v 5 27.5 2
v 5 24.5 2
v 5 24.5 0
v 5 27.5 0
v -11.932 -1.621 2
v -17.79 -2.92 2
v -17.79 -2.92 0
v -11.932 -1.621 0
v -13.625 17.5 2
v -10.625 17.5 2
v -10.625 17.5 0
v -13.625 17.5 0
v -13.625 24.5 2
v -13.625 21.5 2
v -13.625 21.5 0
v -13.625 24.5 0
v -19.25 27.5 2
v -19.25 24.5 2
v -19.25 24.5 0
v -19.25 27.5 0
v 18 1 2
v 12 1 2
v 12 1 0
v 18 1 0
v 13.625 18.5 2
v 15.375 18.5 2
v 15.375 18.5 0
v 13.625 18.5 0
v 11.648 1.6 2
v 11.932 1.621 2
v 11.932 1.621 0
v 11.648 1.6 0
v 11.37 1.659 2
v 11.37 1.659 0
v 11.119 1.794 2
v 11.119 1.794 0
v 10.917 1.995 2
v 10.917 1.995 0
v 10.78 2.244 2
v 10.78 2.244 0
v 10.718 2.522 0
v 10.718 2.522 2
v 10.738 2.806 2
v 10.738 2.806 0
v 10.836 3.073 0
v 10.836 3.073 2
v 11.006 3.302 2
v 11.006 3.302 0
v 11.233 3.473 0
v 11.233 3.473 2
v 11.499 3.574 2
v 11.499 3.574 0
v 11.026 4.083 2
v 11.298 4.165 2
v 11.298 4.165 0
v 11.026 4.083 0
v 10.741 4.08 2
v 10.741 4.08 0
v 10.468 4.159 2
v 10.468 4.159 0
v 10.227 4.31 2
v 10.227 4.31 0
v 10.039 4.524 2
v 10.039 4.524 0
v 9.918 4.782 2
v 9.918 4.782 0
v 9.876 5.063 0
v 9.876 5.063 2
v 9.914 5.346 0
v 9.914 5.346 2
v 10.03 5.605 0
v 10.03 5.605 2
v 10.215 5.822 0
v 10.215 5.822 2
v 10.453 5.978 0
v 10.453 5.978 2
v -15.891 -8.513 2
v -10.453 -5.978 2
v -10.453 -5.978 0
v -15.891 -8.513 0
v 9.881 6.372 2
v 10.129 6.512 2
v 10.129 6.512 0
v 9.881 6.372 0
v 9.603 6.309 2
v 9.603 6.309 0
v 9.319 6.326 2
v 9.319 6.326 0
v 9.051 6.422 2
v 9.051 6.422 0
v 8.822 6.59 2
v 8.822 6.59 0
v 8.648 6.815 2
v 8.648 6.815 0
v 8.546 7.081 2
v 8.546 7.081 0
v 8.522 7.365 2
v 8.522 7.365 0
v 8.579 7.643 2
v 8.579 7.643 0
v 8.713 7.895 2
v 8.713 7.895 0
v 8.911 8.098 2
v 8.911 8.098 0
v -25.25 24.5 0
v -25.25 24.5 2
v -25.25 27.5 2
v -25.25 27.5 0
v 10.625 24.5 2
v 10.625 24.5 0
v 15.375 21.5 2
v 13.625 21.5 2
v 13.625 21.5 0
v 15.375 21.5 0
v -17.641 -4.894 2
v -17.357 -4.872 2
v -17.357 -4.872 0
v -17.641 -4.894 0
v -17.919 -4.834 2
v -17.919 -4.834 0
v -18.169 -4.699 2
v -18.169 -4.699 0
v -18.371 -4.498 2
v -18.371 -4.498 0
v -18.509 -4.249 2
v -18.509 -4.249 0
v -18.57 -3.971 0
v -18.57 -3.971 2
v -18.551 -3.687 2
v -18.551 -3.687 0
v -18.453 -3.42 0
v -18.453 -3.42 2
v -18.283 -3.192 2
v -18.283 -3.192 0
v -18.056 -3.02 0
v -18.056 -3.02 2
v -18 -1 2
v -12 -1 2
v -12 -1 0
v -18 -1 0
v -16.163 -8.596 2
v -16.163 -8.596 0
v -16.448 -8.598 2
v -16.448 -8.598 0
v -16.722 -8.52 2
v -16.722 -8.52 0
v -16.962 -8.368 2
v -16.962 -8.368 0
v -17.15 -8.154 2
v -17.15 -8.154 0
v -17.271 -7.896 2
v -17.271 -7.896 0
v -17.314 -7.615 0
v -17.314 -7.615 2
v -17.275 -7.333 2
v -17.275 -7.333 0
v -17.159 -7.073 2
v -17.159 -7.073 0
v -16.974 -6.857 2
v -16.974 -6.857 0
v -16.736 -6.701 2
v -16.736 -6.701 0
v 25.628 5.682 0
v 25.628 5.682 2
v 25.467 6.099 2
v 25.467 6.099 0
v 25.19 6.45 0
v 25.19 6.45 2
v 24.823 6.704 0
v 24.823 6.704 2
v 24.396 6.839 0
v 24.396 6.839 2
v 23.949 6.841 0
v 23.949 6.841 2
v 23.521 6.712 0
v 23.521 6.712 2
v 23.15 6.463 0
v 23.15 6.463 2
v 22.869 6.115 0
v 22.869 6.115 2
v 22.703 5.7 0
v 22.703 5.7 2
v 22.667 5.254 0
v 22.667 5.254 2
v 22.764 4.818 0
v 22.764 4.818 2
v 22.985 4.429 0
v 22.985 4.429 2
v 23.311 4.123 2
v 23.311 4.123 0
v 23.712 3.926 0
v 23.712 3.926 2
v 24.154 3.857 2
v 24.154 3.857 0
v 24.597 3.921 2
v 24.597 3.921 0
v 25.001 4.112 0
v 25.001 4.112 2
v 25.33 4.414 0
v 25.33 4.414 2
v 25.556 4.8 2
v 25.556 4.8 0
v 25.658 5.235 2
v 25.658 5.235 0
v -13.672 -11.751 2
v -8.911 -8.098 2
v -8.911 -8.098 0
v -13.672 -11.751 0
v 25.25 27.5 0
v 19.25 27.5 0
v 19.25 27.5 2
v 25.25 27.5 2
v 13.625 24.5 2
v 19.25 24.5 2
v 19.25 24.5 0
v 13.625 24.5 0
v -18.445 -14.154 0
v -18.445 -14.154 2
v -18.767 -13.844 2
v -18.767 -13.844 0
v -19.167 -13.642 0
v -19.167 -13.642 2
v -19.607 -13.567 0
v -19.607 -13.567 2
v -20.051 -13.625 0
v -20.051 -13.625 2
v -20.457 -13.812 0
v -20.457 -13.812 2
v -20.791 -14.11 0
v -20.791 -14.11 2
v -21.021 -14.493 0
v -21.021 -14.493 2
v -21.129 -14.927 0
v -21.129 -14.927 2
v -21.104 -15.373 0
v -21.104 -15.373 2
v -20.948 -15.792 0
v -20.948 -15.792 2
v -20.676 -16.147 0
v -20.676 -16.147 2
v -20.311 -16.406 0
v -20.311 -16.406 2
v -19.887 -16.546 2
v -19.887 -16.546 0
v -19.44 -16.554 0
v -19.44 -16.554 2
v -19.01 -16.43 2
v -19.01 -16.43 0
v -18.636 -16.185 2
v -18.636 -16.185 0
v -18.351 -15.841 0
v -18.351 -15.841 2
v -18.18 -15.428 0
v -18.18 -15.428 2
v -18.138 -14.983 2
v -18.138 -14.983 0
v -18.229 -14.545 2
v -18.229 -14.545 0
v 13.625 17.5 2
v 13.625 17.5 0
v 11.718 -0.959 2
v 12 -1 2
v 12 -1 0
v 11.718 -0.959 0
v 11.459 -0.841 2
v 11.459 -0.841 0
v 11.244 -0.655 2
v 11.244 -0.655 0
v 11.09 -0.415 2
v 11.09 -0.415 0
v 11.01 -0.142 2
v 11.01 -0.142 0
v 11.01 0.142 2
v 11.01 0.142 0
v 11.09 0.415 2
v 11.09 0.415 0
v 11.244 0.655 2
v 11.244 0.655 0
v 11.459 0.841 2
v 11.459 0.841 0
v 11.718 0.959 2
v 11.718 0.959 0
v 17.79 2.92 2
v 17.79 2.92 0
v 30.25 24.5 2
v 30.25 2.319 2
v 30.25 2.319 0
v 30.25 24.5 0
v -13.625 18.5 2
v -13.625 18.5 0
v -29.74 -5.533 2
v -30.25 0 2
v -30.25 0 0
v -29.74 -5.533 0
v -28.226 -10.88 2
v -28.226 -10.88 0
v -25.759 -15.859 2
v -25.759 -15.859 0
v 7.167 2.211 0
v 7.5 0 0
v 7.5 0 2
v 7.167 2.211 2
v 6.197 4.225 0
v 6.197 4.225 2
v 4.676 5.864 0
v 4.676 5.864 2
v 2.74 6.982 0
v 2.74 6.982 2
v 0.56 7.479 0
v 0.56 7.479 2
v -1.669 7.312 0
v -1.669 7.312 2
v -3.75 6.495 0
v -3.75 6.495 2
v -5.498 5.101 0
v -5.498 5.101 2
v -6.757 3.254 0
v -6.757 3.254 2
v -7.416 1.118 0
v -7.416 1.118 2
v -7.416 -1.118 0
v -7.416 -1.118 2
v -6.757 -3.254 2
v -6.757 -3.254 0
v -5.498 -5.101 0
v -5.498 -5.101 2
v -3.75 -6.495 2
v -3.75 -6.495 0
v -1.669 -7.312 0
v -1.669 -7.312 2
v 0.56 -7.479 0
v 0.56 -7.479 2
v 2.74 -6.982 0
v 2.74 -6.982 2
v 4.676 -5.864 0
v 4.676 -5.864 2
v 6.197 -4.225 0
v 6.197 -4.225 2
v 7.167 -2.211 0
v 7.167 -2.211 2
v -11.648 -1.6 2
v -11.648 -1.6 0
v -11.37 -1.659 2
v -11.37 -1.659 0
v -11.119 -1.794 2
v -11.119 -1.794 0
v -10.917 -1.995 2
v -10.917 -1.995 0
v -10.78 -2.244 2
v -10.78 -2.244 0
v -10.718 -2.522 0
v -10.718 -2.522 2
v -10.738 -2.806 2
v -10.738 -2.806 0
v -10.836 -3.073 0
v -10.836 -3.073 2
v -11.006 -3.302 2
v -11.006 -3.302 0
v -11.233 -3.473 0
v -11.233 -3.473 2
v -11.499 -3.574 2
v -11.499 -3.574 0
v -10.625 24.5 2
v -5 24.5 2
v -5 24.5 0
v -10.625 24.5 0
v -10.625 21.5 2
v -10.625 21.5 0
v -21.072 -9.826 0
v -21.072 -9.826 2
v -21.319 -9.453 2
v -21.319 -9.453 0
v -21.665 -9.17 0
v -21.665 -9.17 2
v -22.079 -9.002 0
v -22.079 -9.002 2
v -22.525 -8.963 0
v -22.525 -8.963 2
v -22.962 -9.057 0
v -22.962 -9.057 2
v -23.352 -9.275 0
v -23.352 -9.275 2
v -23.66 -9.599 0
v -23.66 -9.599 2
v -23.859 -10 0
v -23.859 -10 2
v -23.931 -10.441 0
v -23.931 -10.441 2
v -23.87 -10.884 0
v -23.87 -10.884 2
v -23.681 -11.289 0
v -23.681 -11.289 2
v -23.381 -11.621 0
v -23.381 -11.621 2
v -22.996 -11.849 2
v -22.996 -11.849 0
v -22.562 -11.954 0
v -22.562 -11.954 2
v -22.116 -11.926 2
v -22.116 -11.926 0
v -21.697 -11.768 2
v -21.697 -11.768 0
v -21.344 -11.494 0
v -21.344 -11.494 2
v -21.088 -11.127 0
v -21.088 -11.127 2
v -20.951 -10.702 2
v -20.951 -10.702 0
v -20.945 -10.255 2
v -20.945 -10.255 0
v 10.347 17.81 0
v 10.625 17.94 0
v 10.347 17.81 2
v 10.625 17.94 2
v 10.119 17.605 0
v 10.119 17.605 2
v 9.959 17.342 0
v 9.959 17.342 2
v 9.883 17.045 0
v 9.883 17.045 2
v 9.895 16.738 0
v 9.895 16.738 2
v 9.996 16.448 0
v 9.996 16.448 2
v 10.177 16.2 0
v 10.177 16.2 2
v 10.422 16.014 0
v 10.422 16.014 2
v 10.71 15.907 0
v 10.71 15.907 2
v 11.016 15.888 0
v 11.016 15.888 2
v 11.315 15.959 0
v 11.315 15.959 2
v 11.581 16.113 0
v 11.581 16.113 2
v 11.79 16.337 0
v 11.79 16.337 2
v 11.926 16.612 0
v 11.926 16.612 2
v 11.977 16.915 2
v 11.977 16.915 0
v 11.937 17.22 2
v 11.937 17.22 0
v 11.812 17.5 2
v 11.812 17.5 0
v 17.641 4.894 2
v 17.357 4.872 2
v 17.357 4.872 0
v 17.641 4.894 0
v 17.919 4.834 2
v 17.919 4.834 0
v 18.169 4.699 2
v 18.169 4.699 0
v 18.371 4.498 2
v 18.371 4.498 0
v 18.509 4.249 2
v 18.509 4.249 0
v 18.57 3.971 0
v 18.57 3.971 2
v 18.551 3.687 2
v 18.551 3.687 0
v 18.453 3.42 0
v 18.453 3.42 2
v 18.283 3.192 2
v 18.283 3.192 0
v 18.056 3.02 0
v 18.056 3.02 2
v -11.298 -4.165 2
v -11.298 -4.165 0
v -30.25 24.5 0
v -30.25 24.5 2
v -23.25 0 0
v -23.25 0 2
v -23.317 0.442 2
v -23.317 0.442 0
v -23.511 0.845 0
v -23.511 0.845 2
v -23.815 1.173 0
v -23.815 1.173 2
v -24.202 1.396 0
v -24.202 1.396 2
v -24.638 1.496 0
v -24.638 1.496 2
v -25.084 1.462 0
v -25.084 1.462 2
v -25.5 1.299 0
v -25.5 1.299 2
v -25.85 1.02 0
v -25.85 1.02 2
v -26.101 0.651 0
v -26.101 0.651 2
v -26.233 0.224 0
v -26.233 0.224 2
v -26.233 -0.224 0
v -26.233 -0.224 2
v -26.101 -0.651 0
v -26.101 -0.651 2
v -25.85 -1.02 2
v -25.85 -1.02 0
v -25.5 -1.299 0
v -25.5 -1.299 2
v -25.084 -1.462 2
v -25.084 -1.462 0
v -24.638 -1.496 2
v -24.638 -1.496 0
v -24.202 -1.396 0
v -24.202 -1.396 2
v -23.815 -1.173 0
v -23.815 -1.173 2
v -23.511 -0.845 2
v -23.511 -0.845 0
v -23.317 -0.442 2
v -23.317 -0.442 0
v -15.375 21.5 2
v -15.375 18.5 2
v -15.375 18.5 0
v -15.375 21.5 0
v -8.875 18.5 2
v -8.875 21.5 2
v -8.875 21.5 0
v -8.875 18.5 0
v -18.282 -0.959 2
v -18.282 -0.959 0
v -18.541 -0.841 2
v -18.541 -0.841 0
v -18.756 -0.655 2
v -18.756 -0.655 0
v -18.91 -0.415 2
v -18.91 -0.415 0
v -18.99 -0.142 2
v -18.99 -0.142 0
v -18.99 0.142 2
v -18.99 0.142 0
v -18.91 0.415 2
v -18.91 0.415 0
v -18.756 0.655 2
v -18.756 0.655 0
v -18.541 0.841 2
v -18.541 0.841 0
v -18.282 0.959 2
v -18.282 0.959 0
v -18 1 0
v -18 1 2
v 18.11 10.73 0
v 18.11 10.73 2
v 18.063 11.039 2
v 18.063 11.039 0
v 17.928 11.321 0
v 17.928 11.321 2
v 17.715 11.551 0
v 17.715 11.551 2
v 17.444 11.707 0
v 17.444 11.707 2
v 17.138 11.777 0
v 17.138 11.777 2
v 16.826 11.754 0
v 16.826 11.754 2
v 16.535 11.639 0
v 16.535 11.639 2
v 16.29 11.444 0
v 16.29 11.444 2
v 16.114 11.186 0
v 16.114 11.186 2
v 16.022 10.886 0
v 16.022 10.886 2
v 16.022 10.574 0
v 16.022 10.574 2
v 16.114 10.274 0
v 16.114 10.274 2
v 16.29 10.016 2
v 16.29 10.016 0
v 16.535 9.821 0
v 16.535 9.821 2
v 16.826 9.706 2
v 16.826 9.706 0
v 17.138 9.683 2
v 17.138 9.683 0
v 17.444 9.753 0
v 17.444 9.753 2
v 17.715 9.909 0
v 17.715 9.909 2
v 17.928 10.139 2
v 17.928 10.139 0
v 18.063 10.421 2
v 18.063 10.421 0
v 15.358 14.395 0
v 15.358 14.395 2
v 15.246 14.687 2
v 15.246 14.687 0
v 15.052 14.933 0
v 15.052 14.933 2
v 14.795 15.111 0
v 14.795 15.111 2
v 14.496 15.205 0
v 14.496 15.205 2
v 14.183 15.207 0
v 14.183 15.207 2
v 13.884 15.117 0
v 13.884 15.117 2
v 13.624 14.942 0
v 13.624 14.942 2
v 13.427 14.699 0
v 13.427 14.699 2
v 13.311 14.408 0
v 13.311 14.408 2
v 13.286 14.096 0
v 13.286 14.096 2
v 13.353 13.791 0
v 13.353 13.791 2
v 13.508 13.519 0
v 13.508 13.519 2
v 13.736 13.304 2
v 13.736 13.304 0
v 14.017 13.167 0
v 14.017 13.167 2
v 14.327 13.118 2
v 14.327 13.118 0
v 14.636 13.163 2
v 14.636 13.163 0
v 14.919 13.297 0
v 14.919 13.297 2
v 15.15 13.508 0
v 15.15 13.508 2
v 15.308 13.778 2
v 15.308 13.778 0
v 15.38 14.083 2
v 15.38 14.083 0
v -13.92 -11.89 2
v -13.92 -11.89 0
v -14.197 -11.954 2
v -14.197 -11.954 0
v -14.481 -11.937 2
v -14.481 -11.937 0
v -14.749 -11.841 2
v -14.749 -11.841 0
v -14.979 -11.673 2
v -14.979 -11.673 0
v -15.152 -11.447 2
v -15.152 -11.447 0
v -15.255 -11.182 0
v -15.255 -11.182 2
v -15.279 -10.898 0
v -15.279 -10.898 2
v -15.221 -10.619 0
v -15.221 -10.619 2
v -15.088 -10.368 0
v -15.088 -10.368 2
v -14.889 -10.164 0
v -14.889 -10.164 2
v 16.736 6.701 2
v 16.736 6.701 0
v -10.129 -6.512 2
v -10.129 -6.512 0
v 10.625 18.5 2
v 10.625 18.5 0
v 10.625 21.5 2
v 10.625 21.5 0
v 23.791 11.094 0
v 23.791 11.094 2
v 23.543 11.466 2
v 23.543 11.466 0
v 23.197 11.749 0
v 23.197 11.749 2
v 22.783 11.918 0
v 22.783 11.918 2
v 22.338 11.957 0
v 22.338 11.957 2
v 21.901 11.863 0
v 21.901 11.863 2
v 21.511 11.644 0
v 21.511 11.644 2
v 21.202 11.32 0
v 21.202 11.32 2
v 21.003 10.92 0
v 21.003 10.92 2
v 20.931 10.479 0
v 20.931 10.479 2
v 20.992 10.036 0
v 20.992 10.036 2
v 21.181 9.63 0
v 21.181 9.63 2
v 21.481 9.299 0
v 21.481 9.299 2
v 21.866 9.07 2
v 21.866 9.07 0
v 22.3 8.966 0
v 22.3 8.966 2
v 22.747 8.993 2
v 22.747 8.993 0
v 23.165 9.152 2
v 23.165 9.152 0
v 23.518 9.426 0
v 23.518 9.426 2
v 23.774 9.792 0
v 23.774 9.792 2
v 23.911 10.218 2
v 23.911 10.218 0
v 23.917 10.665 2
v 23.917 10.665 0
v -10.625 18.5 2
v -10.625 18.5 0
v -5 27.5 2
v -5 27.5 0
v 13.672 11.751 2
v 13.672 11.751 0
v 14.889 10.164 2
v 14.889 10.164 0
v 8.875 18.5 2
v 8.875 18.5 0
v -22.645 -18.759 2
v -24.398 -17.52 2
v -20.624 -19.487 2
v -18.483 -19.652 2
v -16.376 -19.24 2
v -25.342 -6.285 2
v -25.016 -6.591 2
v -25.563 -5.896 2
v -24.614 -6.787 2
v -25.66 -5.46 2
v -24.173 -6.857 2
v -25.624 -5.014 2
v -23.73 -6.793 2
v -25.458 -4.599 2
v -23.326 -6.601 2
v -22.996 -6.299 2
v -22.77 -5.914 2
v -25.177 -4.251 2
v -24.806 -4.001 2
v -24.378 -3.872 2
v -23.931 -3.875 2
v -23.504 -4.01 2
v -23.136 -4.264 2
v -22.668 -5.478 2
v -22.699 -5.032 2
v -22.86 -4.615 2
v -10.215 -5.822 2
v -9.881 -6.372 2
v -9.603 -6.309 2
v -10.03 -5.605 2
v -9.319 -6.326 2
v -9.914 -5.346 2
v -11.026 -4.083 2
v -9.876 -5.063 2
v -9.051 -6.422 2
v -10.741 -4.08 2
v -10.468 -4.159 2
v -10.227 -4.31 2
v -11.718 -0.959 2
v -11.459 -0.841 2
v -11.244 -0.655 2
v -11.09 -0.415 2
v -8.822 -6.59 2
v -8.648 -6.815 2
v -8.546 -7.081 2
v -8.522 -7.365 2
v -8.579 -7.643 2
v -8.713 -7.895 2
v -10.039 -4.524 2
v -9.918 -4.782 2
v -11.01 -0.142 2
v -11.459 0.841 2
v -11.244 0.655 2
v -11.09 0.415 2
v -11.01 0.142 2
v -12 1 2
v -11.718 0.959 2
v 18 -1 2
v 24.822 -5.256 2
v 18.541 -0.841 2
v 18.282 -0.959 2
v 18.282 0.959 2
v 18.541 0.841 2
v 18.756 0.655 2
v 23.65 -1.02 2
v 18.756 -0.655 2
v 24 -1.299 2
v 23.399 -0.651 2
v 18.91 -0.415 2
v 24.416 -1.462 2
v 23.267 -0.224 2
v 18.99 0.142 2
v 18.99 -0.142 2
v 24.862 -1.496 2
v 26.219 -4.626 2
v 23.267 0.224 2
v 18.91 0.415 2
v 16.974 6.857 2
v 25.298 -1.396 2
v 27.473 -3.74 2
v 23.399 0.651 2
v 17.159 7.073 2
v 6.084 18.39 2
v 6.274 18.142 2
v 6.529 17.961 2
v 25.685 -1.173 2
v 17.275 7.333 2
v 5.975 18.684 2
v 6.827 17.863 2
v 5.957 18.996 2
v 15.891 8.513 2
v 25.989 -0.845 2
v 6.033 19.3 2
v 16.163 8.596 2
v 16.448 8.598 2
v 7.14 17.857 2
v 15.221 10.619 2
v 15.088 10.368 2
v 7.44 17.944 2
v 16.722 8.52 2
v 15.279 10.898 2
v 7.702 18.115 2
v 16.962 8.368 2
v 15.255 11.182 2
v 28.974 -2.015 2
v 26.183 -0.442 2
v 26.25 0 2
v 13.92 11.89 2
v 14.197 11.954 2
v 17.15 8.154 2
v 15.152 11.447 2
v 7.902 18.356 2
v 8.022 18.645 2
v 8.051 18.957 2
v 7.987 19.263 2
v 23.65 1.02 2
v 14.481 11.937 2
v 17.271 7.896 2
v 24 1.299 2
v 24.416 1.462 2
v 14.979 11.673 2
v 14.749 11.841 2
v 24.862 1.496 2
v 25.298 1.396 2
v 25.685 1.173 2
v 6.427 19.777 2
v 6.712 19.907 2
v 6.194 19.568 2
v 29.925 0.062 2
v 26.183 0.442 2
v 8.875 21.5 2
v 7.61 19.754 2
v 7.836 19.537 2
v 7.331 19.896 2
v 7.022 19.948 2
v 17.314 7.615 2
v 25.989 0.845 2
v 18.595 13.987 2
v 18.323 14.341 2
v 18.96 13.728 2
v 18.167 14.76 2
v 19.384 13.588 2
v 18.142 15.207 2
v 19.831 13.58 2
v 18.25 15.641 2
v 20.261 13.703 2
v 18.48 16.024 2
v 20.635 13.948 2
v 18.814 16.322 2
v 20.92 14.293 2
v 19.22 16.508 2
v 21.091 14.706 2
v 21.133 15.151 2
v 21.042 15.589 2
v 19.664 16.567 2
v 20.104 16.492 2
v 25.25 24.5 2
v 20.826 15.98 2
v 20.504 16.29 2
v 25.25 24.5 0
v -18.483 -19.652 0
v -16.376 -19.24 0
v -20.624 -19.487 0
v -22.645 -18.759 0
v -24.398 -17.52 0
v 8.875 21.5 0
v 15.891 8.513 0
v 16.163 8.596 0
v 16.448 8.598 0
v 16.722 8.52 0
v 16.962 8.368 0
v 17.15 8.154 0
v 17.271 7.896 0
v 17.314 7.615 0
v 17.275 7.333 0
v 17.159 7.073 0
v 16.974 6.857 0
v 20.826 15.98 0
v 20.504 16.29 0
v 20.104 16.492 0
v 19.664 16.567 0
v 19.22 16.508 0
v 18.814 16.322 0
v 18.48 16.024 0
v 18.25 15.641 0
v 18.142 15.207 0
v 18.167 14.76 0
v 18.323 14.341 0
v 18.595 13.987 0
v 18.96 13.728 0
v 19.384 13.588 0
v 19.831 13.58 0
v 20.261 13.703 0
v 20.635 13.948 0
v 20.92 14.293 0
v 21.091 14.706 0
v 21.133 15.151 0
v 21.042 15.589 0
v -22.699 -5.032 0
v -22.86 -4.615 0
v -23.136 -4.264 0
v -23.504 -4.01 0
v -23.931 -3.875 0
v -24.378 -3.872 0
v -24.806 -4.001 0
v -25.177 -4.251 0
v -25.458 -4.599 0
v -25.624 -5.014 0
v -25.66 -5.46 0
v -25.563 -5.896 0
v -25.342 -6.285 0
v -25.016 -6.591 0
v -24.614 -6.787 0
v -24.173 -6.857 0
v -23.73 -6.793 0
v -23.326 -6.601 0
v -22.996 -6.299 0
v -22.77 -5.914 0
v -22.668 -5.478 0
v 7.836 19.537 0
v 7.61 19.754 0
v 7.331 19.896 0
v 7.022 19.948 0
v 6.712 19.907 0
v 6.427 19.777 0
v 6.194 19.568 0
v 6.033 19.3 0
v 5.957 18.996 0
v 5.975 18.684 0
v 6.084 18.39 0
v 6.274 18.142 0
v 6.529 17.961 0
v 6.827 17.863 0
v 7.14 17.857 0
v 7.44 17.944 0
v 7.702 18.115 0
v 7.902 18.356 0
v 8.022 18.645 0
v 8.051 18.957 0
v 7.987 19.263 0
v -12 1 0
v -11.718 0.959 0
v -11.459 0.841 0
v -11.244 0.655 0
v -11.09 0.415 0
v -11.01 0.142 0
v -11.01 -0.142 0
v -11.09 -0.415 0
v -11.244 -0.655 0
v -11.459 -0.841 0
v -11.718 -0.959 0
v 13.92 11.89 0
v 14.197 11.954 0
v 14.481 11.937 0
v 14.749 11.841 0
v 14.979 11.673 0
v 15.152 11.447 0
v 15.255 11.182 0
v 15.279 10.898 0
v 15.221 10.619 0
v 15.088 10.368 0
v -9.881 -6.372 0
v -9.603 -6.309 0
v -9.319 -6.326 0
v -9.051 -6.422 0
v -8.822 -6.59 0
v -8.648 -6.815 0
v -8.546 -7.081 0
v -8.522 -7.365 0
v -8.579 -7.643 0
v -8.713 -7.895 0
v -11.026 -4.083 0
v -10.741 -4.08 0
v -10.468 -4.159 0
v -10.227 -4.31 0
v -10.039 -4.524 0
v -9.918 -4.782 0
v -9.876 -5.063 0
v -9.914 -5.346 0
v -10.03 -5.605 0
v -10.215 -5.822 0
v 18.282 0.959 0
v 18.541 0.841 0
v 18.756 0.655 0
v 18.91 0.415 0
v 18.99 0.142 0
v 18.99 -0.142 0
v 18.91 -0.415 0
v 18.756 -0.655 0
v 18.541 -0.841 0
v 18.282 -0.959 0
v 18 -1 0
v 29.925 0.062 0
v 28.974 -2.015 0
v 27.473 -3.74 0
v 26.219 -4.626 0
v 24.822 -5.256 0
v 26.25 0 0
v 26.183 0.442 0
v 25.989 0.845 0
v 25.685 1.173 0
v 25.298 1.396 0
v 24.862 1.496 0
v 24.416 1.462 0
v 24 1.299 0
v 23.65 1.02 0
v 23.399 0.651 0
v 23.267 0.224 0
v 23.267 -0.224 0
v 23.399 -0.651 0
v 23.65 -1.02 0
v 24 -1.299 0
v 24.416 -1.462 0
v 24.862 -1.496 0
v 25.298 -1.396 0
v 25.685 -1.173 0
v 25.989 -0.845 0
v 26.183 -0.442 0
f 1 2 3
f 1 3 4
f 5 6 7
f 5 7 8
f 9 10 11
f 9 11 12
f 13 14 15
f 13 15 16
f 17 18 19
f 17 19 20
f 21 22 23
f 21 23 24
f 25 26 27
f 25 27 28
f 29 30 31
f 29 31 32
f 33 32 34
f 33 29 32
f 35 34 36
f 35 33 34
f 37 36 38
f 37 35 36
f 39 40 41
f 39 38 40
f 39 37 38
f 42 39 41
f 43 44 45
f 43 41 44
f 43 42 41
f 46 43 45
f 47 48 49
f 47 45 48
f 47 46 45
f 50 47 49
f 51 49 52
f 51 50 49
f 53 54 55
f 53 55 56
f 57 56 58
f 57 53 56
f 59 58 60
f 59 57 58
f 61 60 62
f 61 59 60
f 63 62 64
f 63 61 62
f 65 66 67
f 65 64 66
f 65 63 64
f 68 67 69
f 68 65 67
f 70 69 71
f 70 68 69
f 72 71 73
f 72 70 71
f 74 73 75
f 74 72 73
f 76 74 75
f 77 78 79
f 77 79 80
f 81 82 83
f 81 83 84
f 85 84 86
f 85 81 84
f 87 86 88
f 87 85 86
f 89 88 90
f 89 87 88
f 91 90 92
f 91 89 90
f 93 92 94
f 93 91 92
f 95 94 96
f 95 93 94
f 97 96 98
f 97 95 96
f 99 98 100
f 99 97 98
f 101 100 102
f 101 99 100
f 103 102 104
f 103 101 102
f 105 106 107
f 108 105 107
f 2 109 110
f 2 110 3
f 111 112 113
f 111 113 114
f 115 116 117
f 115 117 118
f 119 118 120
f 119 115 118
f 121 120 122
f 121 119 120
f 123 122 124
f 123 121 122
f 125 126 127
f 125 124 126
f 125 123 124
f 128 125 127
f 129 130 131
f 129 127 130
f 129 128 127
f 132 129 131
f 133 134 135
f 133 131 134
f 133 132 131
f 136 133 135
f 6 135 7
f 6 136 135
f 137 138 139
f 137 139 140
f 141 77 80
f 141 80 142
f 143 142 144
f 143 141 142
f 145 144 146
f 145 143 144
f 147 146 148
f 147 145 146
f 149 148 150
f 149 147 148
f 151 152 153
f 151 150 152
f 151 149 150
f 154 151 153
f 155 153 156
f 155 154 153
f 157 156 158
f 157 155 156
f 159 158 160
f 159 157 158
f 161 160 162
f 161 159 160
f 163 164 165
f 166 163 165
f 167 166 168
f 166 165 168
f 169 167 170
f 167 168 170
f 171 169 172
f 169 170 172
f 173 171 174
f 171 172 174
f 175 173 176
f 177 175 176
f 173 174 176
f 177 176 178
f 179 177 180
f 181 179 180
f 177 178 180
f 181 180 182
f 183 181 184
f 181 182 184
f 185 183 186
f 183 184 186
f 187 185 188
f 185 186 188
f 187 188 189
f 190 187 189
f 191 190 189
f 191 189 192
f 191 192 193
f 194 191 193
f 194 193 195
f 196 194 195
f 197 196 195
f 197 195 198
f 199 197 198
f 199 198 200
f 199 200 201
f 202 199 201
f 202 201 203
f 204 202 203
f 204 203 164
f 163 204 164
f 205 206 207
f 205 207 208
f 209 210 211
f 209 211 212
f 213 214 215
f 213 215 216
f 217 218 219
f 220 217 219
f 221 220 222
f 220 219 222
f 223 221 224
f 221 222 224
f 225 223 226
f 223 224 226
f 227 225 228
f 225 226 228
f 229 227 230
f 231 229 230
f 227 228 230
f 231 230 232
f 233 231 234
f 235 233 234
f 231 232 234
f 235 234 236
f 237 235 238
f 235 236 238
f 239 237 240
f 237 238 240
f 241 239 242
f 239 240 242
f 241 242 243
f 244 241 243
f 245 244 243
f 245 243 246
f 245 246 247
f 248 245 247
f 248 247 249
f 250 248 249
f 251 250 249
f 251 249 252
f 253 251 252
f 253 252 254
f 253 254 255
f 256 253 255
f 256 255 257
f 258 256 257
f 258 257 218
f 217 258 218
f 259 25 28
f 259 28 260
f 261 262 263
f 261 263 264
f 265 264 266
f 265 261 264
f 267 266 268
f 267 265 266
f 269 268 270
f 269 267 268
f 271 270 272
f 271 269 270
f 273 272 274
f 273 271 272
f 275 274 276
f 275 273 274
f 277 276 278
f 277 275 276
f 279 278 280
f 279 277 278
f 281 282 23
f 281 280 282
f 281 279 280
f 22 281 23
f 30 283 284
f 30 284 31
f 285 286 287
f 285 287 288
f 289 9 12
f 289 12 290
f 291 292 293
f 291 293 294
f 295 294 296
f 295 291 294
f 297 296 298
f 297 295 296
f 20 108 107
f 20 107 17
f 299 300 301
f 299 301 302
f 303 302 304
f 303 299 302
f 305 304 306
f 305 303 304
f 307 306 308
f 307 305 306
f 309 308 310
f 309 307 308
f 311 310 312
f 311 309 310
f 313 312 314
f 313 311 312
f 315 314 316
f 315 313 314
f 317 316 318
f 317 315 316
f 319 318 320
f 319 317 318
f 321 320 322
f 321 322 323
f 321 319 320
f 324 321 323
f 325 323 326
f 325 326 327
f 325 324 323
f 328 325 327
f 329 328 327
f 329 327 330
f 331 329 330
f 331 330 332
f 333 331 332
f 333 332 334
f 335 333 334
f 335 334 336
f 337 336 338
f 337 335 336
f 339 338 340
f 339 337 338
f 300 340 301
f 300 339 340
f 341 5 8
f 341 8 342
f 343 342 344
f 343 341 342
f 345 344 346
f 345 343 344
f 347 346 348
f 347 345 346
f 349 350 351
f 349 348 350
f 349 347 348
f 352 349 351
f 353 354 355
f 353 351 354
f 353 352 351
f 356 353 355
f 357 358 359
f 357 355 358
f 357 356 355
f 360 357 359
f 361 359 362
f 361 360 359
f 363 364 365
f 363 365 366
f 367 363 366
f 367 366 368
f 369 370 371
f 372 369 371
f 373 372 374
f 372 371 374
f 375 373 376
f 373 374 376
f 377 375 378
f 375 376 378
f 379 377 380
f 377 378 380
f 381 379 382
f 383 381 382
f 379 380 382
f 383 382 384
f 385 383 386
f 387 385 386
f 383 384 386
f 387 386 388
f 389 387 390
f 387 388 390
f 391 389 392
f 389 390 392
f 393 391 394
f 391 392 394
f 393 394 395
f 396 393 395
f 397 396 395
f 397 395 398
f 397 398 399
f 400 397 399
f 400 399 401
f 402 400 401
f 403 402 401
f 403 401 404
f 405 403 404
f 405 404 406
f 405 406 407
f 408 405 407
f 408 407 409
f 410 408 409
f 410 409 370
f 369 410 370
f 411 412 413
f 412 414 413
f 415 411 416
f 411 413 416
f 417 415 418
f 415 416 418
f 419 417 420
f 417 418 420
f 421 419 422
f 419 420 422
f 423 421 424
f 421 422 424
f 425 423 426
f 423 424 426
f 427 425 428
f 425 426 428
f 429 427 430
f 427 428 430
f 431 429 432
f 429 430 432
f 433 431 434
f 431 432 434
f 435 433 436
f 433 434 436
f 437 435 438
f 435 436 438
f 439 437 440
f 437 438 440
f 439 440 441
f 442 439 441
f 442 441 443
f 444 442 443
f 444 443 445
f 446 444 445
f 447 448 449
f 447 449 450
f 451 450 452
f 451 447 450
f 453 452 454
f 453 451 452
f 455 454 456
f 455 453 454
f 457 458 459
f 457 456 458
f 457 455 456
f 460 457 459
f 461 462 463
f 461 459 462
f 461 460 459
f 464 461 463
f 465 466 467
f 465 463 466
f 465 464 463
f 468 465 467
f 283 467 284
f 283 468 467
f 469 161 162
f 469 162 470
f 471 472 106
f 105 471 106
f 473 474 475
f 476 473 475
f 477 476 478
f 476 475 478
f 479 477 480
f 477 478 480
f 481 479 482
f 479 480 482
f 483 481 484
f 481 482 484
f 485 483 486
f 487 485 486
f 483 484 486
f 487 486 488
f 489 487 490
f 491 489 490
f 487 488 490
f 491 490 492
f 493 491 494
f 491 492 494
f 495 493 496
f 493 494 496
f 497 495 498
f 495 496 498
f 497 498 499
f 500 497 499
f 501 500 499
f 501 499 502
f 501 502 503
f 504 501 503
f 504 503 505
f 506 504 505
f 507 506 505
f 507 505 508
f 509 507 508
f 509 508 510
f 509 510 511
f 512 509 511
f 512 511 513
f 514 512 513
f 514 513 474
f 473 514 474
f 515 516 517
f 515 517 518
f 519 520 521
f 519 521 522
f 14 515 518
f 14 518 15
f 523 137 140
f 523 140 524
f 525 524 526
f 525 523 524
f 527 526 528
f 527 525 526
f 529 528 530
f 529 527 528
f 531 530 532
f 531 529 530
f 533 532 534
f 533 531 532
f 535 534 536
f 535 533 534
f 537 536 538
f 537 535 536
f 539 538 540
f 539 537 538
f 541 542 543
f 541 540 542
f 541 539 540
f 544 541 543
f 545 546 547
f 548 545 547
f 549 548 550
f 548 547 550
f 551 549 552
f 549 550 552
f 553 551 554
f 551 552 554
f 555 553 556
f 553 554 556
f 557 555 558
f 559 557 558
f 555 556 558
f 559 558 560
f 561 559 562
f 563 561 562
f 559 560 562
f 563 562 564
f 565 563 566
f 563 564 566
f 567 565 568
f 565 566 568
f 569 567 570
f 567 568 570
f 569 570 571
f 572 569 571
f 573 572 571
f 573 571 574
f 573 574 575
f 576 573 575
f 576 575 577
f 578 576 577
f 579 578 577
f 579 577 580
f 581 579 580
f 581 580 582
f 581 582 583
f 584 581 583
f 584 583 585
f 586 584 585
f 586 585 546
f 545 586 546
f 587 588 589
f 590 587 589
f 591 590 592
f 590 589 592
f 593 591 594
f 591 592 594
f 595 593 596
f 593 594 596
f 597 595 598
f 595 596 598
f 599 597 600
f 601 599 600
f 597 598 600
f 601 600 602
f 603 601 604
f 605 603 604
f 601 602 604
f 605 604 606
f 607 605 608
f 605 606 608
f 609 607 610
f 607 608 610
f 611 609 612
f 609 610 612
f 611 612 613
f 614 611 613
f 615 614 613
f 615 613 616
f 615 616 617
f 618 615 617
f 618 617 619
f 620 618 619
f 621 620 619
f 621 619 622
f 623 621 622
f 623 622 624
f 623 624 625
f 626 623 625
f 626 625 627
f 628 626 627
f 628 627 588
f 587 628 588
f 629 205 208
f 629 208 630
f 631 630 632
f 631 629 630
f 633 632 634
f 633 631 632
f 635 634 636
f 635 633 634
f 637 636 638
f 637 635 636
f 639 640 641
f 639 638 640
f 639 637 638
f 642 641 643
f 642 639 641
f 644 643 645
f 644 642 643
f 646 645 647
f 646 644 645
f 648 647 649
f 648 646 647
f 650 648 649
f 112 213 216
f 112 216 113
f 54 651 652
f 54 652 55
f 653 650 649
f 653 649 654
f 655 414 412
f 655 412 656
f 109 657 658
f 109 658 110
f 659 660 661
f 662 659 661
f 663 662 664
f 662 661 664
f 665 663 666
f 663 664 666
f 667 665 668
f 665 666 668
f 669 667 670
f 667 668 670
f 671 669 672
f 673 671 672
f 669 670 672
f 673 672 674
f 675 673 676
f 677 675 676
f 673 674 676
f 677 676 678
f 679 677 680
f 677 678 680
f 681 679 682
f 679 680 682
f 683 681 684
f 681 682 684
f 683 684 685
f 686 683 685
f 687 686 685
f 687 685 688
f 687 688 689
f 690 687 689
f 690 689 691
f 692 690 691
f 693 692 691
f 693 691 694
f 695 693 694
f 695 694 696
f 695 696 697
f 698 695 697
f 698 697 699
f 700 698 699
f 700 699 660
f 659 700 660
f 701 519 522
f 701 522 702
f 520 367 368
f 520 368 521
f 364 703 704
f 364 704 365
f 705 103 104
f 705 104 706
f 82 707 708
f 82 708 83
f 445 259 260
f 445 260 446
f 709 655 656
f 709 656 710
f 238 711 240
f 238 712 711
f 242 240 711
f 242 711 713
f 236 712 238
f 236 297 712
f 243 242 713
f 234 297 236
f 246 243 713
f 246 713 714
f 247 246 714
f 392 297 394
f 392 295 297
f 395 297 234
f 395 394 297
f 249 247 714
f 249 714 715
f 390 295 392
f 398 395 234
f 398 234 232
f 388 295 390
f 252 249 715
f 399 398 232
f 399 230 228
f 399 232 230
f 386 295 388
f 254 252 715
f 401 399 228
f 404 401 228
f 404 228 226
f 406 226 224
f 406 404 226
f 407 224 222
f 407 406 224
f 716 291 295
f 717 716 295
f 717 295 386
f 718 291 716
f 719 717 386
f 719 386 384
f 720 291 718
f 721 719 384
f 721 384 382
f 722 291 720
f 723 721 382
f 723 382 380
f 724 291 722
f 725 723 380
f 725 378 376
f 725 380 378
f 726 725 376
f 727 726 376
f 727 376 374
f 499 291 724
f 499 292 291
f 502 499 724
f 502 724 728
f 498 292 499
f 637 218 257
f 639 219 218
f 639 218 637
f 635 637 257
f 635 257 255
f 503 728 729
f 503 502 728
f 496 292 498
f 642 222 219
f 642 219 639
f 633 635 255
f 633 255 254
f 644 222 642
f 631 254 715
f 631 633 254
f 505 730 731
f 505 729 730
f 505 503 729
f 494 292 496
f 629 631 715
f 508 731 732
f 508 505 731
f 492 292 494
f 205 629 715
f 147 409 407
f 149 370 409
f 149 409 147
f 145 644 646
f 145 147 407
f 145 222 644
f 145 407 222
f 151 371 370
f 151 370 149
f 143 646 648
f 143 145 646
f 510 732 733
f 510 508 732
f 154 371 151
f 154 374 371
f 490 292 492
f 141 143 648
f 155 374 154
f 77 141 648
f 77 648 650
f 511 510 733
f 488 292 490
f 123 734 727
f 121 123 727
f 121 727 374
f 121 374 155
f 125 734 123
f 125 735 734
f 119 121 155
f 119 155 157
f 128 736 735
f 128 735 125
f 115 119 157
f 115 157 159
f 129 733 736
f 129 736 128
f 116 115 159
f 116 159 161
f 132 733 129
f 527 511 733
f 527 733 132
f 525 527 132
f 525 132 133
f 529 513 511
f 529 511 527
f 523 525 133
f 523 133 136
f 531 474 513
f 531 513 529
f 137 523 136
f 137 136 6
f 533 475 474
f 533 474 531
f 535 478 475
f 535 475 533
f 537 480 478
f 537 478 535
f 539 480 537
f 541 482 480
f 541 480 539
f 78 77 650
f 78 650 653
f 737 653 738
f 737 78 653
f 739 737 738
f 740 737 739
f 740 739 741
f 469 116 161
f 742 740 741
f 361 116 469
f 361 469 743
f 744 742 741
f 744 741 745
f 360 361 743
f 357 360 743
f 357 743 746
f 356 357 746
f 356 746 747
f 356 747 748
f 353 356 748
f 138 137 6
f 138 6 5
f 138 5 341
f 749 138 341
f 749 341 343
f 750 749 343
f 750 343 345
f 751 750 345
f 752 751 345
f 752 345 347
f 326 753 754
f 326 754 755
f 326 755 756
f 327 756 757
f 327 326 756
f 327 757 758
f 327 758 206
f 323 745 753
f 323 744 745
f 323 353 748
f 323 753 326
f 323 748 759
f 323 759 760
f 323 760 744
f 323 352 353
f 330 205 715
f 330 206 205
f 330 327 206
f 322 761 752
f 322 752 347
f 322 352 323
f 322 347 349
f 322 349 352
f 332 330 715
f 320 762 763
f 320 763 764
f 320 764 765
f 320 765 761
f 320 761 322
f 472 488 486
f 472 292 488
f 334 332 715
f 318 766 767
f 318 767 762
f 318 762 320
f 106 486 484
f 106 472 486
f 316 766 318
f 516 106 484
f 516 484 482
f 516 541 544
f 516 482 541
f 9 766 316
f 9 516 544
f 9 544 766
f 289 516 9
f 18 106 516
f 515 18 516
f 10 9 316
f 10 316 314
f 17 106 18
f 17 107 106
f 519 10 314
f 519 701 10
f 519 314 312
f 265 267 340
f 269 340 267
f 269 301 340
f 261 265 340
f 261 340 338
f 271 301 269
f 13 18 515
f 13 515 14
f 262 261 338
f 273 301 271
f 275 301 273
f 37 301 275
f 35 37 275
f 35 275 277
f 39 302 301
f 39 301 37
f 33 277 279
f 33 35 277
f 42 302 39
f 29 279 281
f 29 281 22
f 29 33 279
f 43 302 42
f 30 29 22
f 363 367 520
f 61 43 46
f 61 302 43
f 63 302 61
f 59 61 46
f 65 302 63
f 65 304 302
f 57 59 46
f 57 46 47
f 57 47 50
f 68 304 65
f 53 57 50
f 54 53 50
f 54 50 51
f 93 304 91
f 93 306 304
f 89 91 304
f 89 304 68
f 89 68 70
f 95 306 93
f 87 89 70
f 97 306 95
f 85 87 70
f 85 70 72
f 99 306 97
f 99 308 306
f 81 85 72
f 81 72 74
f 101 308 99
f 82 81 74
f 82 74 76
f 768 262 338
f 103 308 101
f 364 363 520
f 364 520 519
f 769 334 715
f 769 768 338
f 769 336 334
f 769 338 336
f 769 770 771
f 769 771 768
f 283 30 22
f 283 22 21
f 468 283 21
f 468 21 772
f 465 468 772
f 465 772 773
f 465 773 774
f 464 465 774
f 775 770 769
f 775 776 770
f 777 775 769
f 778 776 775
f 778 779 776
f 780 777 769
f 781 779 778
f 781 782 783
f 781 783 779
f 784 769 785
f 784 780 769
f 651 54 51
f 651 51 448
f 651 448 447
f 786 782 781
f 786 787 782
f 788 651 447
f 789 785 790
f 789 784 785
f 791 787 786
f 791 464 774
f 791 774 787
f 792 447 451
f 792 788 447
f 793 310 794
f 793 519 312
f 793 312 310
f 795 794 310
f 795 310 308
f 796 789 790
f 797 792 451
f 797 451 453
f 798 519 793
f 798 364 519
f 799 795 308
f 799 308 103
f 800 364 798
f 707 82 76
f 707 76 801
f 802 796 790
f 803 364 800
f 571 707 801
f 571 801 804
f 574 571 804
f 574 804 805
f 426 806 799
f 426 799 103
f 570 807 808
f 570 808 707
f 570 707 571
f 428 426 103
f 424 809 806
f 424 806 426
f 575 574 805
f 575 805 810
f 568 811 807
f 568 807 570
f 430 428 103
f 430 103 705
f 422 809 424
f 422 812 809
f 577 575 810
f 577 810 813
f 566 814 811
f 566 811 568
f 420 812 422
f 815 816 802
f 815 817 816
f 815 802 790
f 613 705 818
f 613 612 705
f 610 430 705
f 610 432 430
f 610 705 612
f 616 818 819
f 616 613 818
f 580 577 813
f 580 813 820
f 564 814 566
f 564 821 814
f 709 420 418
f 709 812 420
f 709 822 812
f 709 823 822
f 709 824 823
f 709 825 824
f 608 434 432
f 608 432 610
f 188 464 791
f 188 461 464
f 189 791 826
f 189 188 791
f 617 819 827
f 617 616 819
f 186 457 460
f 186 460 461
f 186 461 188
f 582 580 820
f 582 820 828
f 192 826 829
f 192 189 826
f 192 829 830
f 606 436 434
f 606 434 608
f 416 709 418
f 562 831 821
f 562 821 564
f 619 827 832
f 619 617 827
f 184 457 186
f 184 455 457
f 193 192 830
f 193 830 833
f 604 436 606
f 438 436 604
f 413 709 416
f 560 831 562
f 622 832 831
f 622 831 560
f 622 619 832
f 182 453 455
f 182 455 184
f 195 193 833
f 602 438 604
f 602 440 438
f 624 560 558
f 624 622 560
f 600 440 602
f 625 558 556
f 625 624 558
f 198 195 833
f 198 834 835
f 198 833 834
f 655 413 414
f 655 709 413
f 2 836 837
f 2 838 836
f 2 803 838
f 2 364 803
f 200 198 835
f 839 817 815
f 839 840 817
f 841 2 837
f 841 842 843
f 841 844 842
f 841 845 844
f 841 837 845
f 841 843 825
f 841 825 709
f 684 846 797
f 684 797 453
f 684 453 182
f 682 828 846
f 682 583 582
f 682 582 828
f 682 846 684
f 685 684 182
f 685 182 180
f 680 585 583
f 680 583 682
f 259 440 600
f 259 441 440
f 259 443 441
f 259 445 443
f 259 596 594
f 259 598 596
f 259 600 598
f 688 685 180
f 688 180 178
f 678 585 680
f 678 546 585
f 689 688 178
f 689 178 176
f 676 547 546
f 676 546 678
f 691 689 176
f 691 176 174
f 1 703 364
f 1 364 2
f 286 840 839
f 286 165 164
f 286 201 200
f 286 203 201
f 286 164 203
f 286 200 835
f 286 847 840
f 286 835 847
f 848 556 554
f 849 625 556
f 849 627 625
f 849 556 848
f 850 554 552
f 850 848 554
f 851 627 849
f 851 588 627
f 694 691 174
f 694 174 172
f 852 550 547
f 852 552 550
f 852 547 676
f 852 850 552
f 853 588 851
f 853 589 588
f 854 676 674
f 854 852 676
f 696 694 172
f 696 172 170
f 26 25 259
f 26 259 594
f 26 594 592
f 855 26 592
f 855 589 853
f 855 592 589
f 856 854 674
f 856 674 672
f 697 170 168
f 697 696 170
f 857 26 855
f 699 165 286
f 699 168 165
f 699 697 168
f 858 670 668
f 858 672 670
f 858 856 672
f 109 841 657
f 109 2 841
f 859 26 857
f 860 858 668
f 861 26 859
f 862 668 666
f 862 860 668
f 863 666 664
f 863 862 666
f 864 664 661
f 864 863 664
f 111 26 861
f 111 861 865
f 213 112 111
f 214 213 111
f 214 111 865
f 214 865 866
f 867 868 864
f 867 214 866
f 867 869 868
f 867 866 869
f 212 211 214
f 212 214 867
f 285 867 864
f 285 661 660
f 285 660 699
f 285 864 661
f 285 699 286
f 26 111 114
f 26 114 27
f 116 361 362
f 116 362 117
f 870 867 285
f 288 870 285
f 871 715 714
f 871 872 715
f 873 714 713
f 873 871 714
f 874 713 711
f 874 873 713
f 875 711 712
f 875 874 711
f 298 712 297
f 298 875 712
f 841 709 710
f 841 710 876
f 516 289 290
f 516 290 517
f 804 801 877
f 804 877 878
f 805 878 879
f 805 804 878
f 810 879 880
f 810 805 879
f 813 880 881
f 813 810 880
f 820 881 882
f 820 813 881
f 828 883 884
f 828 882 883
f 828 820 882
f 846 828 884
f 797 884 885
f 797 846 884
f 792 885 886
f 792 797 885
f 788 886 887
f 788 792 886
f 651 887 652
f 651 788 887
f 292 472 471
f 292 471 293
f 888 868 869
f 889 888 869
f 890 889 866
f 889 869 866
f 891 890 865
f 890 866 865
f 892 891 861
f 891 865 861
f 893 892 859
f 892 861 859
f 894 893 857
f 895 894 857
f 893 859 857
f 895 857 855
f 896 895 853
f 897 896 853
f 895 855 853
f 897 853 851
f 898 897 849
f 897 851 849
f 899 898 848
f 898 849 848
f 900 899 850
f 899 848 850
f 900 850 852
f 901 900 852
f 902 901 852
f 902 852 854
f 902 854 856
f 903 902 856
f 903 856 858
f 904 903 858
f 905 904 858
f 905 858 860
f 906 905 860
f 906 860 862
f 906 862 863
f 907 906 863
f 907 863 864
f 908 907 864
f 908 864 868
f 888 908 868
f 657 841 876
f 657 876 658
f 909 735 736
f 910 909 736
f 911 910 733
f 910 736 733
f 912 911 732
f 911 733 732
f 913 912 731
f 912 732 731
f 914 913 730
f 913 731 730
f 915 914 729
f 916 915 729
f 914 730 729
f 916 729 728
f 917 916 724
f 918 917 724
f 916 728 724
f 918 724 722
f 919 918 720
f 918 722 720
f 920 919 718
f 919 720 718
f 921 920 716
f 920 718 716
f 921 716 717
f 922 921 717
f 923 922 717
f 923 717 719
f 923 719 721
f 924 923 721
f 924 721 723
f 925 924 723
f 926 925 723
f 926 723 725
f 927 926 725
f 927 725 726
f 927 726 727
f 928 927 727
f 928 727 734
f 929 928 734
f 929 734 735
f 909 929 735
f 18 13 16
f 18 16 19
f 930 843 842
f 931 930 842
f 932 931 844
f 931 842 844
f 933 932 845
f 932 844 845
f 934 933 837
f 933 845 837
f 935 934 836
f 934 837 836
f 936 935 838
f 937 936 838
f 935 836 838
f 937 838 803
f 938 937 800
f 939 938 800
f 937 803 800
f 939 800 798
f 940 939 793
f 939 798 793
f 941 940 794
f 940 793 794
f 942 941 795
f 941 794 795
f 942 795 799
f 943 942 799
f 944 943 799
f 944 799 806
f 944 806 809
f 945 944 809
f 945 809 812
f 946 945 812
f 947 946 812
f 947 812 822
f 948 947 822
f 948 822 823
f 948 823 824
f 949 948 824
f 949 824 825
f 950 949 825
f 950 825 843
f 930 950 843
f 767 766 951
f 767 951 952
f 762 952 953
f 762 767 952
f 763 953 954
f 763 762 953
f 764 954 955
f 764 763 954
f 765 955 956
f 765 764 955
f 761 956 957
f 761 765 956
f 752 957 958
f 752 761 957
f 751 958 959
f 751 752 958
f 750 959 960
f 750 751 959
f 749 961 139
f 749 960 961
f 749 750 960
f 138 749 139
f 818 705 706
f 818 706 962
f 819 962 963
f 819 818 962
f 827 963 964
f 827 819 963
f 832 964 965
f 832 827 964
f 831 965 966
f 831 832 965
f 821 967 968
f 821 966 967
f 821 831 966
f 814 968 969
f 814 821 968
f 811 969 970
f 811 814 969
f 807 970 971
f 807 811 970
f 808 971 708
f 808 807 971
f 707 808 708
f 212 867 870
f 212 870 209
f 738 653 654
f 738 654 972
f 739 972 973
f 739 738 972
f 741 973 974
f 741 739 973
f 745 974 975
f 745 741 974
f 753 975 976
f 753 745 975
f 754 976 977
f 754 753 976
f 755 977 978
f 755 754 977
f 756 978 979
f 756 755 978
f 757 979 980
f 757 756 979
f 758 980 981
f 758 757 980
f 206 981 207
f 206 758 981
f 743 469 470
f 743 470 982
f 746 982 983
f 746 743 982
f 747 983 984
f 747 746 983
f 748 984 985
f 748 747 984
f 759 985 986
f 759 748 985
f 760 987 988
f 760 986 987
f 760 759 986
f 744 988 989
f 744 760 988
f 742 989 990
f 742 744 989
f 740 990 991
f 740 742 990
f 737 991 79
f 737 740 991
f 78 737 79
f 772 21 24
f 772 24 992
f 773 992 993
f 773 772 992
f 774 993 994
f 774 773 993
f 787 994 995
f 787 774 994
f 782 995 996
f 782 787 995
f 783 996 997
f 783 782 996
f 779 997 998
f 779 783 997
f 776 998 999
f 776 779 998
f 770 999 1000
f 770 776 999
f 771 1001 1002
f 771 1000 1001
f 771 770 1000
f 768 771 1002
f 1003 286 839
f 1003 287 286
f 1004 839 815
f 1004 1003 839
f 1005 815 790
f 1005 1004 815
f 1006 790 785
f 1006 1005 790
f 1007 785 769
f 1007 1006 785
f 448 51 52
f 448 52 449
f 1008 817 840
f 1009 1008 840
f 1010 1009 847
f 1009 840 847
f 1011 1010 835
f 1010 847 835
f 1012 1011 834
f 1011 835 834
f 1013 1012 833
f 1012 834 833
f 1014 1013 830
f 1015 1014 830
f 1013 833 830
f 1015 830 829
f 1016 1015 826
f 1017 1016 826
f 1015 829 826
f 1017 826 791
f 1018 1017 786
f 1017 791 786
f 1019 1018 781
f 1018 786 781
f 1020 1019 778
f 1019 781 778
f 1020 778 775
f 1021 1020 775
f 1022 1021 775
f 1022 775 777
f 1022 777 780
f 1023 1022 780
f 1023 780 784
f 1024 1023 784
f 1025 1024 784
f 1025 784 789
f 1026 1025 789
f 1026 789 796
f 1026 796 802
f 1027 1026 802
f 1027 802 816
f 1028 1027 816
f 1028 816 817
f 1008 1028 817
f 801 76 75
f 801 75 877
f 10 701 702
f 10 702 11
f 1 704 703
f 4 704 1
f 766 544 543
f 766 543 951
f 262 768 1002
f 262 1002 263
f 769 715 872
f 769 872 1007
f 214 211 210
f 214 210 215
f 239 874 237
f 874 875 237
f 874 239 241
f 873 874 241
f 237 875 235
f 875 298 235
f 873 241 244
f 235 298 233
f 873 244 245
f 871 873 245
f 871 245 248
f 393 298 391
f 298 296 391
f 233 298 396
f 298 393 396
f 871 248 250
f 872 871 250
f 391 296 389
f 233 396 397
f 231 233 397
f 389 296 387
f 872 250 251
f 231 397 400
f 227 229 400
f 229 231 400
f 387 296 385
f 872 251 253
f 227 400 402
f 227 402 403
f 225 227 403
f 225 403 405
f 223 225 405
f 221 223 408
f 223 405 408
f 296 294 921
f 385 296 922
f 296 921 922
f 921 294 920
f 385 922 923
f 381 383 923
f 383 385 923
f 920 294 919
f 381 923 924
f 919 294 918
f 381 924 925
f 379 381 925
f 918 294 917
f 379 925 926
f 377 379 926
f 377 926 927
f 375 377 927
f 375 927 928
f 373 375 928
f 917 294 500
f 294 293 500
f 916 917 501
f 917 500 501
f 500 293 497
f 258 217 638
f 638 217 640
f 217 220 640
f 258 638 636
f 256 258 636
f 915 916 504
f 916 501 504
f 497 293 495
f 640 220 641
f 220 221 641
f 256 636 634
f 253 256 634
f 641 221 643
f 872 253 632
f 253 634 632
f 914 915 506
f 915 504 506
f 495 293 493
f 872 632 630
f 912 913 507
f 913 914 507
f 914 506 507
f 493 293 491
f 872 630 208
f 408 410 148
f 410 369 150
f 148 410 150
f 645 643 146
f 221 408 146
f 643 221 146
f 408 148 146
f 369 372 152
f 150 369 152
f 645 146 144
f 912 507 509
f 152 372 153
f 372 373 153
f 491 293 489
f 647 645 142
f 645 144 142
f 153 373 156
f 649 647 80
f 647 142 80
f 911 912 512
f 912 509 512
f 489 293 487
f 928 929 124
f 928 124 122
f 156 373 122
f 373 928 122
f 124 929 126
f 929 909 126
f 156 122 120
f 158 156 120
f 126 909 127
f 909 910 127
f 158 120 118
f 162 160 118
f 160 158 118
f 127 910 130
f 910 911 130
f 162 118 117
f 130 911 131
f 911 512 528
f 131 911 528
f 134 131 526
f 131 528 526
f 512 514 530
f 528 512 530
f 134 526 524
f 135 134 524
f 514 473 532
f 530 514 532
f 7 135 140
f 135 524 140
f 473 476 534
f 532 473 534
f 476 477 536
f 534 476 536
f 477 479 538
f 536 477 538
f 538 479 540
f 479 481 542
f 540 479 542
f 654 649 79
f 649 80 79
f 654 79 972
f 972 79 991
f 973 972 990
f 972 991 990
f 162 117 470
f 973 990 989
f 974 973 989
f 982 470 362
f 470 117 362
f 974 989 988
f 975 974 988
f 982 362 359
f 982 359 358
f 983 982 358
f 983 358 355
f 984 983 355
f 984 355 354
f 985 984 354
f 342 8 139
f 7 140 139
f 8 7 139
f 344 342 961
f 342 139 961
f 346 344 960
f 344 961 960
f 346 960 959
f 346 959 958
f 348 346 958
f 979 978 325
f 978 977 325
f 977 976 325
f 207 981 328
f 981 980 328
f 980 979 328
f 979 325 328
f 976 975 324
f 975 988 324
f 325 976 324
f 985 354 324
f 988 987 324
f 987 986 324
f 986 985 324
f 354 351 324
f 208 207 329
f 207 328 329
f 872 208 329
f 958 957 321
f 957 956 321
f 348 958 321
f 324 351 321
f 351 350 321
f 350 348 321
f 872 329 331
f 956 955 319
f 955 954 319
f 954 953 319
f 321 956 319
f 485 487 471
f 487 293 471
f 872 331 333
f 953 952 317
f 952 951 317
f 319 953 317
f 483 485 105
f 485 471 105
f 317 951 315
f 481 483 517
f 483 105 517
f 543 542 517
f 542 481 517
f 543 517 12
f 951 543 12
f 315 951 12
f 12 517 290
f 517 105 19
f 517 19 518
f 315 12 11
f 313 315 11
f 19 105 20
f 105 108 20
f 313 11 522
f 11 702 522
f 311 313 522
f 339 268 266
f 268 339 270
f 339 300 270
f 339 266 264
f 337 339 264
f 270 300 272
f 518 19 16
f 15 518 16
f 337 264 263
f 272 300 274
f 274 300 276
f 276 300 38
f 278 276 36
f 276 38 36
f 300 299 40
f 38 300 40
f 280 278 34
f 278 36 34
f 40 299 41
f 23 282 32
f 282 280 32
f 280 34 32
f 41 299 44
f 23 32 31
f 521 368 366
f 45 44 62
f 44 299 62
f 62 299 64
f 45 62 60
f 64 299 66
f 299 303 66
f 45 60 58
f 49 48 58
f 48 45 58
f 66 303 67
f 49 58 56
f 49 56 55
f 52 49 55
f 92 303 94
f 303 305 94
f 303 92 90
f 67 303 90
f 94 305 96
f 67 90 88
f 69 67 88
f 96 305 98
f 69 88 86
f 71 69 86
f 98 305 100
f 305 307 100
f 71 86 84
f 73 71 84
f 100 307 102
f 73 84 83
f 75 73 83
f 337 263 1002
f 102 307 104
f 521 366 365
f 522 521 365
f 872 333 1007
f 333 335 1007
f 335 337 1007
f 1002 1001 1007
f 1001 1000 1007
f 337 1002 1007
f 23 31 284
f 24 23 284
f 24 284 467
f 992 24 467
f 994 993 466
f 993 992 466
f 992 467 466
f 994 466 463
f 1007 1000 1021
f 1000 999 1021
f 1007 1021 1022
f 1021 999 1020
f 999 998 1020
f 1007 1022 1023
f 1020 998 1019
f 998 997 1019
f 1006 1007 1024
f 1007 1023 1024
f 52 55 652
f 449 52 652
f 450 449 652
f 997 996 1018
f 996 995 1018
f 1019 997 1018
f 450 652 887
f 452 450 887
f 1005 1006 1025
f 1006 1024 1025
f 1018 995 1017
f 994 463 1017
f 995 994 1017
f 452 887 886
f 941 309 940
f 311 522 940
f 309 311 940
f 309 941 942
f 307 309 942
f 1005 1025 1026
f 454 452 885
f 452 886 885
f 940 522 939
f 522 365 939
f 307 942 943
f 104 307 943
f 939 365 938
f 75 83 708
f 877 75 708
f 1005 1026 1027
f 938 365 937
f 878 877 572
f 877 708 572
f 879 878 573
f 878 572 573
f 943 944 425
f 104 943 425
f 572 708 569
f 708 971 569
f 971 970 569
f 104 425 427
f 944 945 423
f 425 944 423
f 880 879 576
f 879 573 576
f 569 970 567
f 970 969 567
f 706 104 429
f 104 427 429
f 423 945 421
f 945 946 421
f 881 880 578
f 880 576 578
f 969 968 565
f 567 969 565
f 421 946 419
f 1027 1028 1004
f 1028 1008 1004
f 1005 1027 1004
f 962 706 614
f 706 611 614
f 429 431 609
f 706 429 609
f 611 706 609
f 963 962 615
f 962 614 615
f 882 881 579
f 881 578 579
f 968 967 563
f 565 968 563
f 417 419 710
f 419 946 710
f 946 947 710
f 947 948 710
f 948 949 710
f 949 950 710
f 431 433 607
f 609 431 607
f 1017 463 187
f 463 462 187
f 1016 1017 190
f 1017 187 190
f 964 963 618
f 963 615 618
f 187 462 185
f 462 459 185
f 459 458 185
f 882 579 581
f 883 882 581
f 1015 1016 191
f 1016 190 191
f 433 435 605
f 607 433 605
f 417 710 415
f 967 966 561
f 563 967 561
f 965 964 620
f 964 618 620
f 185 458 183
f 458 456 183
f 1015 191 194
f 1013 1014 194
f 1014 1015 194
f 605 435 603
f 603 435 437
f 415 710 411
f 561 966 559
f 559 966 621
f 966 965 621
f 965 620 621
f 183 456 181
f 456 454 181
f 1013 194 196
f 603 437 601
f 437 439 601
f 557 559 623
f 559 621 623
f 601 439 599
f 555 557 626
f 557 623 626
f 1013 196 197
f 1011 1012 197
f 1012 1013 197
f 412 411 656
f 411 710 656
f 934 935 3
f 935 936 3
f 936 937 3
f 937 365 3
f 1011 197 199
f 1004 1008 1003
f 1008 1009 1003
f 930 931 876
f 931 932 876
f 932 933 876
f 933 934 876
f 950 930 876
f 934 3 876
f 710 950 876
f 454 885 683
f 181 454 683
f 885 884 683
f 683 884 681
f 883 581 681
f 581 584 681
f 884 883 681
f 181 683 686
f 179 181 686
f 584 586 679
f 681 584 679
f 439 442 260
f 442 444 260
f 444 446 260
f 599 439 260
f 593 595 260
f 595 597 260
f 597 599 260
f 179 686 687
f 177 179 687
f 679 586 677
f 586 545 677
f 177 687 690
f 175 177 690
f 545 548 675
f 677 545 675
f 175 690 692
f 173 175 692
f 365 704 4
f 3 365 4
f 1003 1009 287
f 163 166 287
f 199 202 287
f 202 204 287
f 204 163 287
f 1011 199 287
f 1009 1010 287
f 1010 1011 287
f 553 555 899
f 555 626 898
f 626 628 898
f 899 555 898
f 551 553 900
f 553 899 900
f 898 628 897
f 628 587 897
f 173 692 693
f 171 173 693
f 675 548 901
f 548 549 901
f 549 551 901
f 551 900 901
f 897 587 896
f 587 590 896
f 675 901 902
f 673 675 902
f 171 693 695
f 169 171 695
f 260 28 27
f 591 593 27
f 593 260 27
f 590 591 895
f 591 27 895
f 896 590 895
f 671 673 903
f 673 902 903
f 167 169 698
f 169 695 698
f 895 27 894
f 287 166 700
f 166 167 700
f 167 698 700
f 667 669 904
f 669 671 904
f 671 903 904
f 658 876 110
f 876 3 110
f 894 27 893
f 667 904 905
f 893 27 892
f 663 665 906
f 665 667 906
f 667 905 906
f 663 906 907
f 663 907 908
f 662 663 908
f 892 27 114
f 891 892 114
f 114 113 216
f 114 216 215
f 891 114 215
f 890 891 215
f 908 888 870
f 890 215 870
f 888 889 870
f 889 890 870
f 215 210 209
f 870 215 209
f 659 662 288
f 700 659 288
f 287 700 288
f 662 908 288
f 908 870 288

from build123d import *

# Parameters (mm, degrees)
SKETCH_1_W               = 61.5
SKETCH_1_H               = 55
SKETCH_1_R               = 7.5
EXTRUDE_1_DEPTH          = 2
SKETCH_2_R               = 1.5
SKETCH_2_R_2             = 1.05
CUT_EXTRUDE_1_DEPTH      = 42.301483024
PATTERN_CIRCULAR_1_COUNT = 4
PATTERN_CIRCULAR_1_ANGLE = 37.5
CUT_EXTRUDE_2_DEPTH      = 42.301483024
FILLET_1_R               = 8
SKETCH_5_W               = 5
SKETCH_5_H               = 3
CUT_EXTRUDE_3_DEPTH      = 41.930581622


with BuildPart() as part:
    # 草图1 → 凸台-拉伸1 (new body)
    with BuildSketch(Plane.XY):
        Rectangle(SKETCH_1_W, SKETCH_1_H)
        Circle(SKETCH_1_R, mode=Mode.SUBTRACT)
    extrude(amount=EXTRUDE_1_DEPTH)

    # 草图2 → 切除-拉伸1 (cut, through all)
    with BuildSketch(Plane.XY.offset(2)):
        with Locations((24.75, 0)):
            Circle(SKETCH_2_R)
        with Locations((-24.75, 0)):
            Circle(SKETCH_2_R)
        with Locations((17.06, 10.73)):
            Circle(SKETCH_2_R_2)
        with BuildLine():
            Line((-18, 1), (-12, 1))
            ThreePointArc((-12, 1), (-11, 0), (-12, -1))
            Line((-12, -1), (-18, -1))
            ThreePointArc((-18, -1), (-19, 0), (-18, 1))
        make_face()
        with BuildLine():
            Line((12, 1), (18, 1))
            ThreePointArc((18, 1), (19, 0), (18, -1))
            Line((18, -1), (12, -1))
            ThreePointArc((12, -1), (11, 0), (12, 1))
        make_face()
    cut_extrude_1 = extrude(amount=-CUT_EXTRUDE_1_DEPTH, mode=Mode.SUBTRACT)

    # 阵列(圆周)1: 切除-拉伸1 ×4 about axis
    pattern_circular_1_axis = Axis((0, 0, 0), (0, 0, 1))
    for i in range(1, PATTERN_CIRCULAR_1_COUNT):
        add(cut_extrude_1.rotate(pattern_circular_1_axis, i * PATTERN_CIRCULAR_1_ANGLE / (PATTERN_CIRCULAR_1_COUNT - 1)), mode=Mode.SUBTRACT)

    # 草图3 → 切除-拉伸2 (cut, through all)
    with BuildSketch(Plane.XY.offset(2)):
        with BuildLine():
            Line((-21.720093373, -21.05469173), (30.048992854, -3.481454933))
            ThreePointArc((30.048992854, -3.481454933), (30.199706405, -1.743626417), (30.25, 0))
            Line((30.25, 0), (30.25, 27.5))
            Line((30.25, 27.5), (30.75, 27.5))
            Line((30.75, 27.5), (30.75, 0))
            Line((30.75, 0), (30.75, -27.5))
            Line((30.75, -27.5), (-30.75, -27.5))
            Line((-30.75, -27.5), (-30.75, 0))
            Line((-30.75, 0), (-30.75, 27.5))
            Line((-30.75, 27.5), (-30.25, 27.5))
            Line((-30.25, 27.5), (-30.25, 0))
            ThreePointArc((-30.25, 0), (-28.036541553, -11.358469867), (-21.720093373, -21.05469173))
        make_face()
    extrude(amount=-CUT_EXTRUDE_2_DEPTH, mode=Mode.SUBTRACT)

    # 圆角1
    fillet_1_edges = [part.edges().sort_by_distance(p)[0] for p in [
        (30.048992854, -3.481454933, 1),
        (-21.720093373, -21.05469173, 1),
    ]]
    fillet(fillet_1_edges, radius=FILLET_1_R)

    # 草图5 → 切除-拉伸3 (cut, through all)
    with BuildSketch(Plane.XY.offset(2)):
        with Locations((-27.75, 26)):
            Rectangle(SKETCH_5_W, SKETCH_5_H)
        Polygon((-19.25, 27.5), (-5, 27.5), (-5, 24.5), (-10.625, 24.5), (-10.625, 21.5), (-8.875, 21.5), (-8.875, 18.5), (-10.625, 18.5), (-10.625, 17.5), (-13.625, 17.5), (-13.625, 18.5), (-15.375, 18.5), (-15.375, 21.5), (-13.625, 21.5), (-13.625, 24.5), (-19.25, 24.5), align=None)
        Polygon((5, 27.5), (19.25, 27.5), (19.25, 24.5), (13.625, 24.5), (13.625, 21.5), (15.375, 21.5), (15.375, 18.5), (13.625, 18.5), (13.625, 17.5), (10.625, 17.5), (10.625, 18.5), (8.875, 18.5), (8.875, 21.5), (10.625, 21.5), (10.625, 24.5), (5, 24.5), align=None)
        with Locations((27.75, 26)):
            Rectangle(SKETCH_5_W, SKETCH_5_H)
    extrude(amount=-CUT_EXTRUDE_3_DEPTH, mode=Mode.SUBTRACT)


solid = part.part
